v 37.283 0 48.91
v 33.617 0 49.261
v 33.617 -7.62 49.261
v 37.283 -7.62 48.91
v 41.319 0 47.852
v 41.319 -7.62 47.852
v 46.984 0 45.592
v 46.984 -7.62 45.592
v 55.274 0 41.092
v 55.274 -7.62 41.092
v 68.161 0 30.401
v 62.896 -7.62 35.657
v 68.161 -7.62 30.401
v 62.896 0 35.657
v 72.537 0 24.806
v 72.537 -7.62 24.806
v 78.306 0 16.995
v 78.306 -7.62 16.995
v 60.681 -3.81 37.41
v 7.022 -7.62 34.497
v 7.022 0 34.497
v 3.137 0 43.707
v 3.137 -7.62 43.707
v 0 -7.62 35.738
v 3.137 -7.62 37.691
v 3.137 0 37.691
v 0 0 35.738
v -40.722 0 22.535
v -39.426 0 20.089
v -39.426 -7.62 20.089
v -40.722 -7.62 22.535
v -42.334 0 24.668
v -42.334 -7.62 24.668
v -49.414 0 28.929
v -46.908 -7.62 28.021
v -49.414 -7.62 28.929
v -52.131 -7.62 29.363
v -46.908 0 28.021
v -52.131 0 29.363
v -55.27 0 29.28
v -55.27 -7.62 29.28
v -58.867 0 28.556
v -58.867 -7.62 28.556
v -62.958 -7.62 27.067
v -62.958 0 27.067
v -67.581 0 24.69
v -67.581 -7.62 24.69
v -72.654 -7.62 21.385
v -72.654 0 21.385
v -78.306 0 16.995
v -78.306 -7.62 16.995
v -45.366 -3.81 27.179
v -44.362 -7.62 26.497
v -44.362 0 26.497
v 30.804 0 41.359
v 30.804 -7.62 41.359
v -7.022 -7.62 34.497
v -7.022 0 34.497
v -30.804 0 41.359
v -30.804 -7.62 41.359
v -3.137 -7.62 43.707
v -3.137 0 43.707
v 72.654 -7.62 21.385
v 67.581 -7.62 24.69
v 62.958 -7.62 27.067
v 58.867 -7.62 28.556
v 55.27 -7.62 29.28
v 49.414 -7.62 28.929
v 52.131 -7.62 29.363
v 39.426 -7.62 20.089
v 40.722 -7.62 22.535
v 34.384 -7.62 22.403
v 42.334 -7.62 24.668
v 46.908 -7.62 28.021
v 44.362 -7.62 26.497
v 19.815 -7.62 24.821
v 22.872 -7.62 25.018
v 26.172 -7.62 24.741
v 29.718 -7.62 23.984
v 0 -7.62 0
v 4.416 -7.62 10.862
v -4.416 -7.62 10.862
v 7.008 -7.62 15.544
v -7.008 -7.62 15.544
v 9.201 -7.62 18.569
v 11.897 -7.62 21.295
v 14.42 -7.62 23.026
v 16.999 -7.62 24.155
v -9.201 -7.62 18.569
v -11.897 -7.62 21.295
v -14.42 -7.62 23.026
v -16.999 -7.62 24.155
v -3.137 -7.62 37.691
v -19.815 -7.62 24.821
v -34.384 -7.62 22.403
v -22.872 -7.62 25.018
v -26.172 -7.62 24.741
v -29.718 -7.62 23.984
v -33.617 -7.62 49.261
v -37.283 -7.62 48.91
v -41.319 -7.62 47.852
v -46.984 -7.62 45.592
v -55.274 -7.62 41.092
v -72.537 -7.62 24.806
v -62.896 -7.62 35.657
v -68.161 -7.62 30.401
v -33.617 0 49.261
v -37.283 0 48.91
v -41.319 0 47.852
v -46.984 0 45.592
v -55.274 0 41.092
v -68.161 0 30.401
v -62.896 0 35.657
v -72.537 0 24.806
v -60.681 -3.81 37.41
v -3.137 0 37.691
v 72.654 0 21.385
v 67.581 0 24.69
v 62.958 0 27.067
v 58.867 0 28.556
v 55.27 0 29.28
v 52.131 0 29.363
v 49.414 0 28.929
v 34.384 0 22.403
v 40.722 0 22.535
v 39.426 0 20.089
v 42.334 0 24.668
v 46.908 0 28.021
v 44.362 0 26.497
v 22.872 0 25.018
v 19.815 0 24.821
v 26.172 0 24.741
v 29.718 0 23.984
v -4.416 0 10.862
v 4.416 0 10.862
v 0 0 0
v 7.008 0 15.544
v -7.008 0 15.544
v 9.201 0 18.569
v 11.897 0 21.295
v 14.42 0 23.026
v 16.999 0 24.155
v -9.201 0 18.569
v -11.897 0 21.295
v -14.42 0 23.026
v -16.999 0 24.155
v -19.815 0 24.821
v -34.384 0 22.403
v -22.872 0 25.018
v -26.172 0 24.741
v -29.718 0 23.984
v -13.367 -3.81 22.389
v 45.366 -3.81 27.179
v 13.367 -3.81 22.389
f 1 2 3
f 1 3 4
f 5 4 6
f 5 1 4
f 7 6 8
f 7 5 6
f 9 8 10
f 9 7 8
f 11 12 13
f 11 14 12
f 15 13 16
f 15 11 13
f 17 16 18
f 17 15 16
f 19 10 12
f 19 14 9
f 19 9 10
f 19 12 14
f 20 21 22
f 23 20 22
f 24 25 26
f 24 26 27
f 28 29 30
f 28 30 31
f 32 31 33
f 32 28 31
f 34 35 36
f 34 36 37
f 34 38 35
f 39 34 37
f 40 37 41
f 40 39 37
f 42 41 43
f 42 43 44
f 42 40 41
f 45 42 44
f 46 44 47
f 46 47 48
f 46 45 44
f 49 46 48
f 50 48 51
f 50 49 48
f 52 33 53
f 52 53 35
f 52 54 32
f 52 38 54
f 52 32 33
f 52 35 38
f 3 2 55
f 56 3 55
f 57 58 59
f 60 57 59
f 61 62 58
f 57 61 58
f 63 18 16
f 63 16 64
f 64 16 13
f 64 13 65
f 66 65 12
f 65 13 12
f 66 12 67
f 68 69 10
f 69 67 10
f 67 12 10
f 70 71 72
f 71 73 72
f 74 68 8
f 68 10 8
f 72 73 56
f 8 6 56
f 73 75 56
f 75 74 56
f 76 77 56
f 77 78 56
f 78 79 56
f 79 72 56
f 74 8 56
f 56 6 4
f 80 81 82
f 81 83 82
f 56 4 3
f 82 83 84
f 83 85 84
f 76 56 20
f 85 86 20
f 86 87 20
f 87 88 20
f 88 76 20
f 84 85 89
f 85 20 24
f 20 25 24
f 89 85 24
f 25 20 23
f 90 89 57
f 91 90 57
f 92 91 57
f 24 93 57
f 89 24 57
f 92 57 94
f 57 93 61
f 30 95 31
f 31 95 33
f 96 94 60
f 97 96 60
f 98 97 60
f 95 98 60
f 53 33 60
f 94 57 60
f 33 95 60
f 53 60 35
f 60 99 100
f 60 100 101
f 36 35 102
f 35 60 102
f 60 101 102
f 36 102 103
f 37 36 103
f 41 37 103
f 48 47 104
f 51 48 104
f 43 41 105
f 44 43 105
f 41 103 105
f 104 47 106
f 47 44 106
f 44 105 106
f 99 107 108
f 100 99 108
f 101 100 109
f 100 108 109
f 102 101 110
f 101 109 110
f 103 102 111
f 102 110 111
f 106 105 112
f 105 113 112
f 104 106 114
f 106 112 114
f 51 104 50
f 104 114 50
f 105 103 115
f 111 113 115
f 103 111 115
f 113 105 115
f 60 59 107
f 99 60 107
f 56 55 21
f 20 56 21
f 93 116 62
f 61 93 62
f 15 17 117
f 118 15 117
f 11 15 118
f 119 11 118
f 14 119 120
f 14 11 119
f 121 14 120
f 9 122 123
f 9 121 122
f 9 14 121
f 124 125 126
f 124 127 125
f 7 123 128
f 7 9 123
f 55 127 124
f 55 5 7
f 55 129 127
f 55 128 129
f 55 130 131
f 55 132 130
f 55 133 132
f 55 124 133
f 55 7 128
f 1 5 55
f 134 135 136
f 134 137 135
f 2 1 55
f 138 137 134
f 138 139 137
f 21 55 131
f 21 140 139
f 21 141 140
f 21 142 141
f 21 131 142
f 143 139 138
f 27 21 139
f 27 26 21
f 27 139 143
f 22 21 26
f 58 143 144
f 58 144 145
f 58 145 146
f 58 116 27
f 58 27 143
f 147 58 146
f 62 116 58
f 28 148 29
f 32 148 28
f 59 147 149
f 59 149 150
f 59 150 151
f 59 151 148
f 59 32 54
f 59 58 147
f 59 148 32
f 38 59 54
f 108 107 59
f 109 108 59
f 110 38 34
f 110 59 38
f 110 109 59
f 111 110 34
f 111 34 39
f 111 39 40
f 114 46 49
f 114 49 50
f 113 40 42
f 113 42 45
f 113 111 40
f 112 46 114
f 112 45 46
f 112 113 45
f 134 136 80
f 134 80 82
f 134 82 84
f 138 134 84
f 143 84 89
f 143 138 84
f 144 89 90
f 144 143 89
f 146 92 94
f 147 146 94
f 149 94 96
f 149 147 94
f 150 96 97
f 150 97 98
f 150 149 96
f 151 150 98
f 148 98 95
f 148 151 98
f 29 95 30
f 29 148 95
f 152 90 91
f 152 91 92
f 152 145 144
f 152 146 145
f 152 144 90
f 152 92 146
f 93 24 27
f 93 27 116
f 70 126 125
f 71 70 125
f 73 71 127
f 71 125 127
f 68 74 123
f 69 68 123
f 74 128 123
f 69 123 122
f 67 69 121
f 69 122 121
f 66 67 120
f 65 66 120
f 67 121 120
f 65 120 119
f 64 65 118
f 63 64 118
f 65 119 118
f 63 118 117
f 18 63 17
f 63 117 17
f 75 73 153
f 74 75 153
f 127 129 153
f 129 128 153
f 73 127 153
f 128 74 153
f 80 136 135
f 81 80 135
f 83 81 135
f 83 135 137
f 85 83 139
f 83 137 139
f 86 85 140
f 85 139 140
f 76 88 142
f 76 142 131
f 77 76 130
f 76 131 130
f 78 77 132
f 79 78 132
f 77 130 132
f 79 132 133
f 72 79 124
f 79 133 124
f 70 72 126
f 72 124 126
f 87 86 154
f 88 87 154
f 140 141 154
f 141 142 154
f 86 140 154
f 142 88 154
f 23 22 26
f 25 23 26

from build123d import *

# Parameters (mm, degrees)
F1_DEPTH = 7.62


with BuildPart() as f1:
    # F0 (on Front) → F1 (new body)
    with BuildSketch(Plane.XZ):
        with BuildLine():
            add(Edge.make_bspline(
                [(0, 0), (-3.4022271567, 9.5182356749), (-10.9690679678, 27.1009200022), (-28.1668864191, 25.8614681661), (-39.4263193011, 20.0893059373)],
                knots=[0, 0, 0, 0, 0.4995903231, 1, 1, 1, 1], degree=3))
            Line((0, 0), (0, 35.737555474))
            Line((0, 35.737555474), (-3.1367728952, 37.6913771033))
            Line((-3.1367728952, 37.6913771033), (-3.1367728952, 43.706933278))
            Line((-3.1367728952, 43.706933278), (-7.0221456699, 34.4971604645))
            Line((-7.0221456699, 34.4971604645), (-30.8036413044, 41.3585789502))
            Line((-30.8036413044, 41.3585789502), (-33.6170228571, 49.2606103394))
            add(Edge.make_bspline(
                [(-33.6170228571, 49.2606103394), (-41.4413912857, 49.3800380531), (-65.007380458, 36.5262842704), (-69.9772851484, 28.1731315931), (-78.3058434332, 16.9950854039)],
                knots=[0, 0, 0, 0, 0.5113918248, 1, 1, 1, 1], degree=3))
            add(Edge.make_bspline(
                [(-39.4263193011, 20.0893059373), (-40.7618194231, 23.0609141249), (-45.9085285726, 29.9278450611), (-60.4370668622, 31.9158113047), (-78.3058434332, 16.9950854039)],
                knots=[0, 0, 0, 0, 0.3412147066, 1, 1, 1, 1], degree=3))
        make_face()
        with BuildLine():
            Line((0, 35.737555474), (0, 0))
            add(Edge.make_bspline(
                [(0, 0), (3.4022271567, 9.5182356749), (10.9690679678, 27.1009200022), (28.1668864191, 25.8614681661), (39.4263193011, 20.0893059373)],
                knots=[0, 0, 0, 0, 0.4995903231, 1, 1, 1, 1], degree=3))
            add(Edge.make_bspline(
                [(39.4263193011, 20.0893059373), (40.7618194231, 23.0609141249), (45.9085285726, 29.9278450611), (60.4370668622, 31.9158113047), (78.3058434332, 16.9950854039)],
                knots=[0, 0, 0, 0, 0.3412147066, 1, 1, 1, 1], degree=3))
            add(Edge.make_bspline(
                [(33.6170228571, 49.2606103394), (41.4413912857, 49.3800380531), (65.007380458, 36.5262842704), (69.9772851484, 28.1731315931), (78.3058434332, 16.9950854039)],
                knots=[0, 0, 0, 0, 0.5113918248, 1, 1, 1, 1], degree=3))
            Line((33.6170228571, 49.2606103394), (30.8036413044, 41.3585789502))
            Line((30.8036413044, 41.3585789502), (7.0221456699, 34.4971604645))
            Line((7.0221456699, 34.4971604645), (3.1367728952, 43.706933278))
            Line((3.1367728952, 43.706933278), (3.1367728952, 37.6913771033))
            Line((3.1367728952, 37.6913771033), (0, 35.737555474))
        make_face()
    extrude(amount=F1_DEPTH)


solid = f1.part
